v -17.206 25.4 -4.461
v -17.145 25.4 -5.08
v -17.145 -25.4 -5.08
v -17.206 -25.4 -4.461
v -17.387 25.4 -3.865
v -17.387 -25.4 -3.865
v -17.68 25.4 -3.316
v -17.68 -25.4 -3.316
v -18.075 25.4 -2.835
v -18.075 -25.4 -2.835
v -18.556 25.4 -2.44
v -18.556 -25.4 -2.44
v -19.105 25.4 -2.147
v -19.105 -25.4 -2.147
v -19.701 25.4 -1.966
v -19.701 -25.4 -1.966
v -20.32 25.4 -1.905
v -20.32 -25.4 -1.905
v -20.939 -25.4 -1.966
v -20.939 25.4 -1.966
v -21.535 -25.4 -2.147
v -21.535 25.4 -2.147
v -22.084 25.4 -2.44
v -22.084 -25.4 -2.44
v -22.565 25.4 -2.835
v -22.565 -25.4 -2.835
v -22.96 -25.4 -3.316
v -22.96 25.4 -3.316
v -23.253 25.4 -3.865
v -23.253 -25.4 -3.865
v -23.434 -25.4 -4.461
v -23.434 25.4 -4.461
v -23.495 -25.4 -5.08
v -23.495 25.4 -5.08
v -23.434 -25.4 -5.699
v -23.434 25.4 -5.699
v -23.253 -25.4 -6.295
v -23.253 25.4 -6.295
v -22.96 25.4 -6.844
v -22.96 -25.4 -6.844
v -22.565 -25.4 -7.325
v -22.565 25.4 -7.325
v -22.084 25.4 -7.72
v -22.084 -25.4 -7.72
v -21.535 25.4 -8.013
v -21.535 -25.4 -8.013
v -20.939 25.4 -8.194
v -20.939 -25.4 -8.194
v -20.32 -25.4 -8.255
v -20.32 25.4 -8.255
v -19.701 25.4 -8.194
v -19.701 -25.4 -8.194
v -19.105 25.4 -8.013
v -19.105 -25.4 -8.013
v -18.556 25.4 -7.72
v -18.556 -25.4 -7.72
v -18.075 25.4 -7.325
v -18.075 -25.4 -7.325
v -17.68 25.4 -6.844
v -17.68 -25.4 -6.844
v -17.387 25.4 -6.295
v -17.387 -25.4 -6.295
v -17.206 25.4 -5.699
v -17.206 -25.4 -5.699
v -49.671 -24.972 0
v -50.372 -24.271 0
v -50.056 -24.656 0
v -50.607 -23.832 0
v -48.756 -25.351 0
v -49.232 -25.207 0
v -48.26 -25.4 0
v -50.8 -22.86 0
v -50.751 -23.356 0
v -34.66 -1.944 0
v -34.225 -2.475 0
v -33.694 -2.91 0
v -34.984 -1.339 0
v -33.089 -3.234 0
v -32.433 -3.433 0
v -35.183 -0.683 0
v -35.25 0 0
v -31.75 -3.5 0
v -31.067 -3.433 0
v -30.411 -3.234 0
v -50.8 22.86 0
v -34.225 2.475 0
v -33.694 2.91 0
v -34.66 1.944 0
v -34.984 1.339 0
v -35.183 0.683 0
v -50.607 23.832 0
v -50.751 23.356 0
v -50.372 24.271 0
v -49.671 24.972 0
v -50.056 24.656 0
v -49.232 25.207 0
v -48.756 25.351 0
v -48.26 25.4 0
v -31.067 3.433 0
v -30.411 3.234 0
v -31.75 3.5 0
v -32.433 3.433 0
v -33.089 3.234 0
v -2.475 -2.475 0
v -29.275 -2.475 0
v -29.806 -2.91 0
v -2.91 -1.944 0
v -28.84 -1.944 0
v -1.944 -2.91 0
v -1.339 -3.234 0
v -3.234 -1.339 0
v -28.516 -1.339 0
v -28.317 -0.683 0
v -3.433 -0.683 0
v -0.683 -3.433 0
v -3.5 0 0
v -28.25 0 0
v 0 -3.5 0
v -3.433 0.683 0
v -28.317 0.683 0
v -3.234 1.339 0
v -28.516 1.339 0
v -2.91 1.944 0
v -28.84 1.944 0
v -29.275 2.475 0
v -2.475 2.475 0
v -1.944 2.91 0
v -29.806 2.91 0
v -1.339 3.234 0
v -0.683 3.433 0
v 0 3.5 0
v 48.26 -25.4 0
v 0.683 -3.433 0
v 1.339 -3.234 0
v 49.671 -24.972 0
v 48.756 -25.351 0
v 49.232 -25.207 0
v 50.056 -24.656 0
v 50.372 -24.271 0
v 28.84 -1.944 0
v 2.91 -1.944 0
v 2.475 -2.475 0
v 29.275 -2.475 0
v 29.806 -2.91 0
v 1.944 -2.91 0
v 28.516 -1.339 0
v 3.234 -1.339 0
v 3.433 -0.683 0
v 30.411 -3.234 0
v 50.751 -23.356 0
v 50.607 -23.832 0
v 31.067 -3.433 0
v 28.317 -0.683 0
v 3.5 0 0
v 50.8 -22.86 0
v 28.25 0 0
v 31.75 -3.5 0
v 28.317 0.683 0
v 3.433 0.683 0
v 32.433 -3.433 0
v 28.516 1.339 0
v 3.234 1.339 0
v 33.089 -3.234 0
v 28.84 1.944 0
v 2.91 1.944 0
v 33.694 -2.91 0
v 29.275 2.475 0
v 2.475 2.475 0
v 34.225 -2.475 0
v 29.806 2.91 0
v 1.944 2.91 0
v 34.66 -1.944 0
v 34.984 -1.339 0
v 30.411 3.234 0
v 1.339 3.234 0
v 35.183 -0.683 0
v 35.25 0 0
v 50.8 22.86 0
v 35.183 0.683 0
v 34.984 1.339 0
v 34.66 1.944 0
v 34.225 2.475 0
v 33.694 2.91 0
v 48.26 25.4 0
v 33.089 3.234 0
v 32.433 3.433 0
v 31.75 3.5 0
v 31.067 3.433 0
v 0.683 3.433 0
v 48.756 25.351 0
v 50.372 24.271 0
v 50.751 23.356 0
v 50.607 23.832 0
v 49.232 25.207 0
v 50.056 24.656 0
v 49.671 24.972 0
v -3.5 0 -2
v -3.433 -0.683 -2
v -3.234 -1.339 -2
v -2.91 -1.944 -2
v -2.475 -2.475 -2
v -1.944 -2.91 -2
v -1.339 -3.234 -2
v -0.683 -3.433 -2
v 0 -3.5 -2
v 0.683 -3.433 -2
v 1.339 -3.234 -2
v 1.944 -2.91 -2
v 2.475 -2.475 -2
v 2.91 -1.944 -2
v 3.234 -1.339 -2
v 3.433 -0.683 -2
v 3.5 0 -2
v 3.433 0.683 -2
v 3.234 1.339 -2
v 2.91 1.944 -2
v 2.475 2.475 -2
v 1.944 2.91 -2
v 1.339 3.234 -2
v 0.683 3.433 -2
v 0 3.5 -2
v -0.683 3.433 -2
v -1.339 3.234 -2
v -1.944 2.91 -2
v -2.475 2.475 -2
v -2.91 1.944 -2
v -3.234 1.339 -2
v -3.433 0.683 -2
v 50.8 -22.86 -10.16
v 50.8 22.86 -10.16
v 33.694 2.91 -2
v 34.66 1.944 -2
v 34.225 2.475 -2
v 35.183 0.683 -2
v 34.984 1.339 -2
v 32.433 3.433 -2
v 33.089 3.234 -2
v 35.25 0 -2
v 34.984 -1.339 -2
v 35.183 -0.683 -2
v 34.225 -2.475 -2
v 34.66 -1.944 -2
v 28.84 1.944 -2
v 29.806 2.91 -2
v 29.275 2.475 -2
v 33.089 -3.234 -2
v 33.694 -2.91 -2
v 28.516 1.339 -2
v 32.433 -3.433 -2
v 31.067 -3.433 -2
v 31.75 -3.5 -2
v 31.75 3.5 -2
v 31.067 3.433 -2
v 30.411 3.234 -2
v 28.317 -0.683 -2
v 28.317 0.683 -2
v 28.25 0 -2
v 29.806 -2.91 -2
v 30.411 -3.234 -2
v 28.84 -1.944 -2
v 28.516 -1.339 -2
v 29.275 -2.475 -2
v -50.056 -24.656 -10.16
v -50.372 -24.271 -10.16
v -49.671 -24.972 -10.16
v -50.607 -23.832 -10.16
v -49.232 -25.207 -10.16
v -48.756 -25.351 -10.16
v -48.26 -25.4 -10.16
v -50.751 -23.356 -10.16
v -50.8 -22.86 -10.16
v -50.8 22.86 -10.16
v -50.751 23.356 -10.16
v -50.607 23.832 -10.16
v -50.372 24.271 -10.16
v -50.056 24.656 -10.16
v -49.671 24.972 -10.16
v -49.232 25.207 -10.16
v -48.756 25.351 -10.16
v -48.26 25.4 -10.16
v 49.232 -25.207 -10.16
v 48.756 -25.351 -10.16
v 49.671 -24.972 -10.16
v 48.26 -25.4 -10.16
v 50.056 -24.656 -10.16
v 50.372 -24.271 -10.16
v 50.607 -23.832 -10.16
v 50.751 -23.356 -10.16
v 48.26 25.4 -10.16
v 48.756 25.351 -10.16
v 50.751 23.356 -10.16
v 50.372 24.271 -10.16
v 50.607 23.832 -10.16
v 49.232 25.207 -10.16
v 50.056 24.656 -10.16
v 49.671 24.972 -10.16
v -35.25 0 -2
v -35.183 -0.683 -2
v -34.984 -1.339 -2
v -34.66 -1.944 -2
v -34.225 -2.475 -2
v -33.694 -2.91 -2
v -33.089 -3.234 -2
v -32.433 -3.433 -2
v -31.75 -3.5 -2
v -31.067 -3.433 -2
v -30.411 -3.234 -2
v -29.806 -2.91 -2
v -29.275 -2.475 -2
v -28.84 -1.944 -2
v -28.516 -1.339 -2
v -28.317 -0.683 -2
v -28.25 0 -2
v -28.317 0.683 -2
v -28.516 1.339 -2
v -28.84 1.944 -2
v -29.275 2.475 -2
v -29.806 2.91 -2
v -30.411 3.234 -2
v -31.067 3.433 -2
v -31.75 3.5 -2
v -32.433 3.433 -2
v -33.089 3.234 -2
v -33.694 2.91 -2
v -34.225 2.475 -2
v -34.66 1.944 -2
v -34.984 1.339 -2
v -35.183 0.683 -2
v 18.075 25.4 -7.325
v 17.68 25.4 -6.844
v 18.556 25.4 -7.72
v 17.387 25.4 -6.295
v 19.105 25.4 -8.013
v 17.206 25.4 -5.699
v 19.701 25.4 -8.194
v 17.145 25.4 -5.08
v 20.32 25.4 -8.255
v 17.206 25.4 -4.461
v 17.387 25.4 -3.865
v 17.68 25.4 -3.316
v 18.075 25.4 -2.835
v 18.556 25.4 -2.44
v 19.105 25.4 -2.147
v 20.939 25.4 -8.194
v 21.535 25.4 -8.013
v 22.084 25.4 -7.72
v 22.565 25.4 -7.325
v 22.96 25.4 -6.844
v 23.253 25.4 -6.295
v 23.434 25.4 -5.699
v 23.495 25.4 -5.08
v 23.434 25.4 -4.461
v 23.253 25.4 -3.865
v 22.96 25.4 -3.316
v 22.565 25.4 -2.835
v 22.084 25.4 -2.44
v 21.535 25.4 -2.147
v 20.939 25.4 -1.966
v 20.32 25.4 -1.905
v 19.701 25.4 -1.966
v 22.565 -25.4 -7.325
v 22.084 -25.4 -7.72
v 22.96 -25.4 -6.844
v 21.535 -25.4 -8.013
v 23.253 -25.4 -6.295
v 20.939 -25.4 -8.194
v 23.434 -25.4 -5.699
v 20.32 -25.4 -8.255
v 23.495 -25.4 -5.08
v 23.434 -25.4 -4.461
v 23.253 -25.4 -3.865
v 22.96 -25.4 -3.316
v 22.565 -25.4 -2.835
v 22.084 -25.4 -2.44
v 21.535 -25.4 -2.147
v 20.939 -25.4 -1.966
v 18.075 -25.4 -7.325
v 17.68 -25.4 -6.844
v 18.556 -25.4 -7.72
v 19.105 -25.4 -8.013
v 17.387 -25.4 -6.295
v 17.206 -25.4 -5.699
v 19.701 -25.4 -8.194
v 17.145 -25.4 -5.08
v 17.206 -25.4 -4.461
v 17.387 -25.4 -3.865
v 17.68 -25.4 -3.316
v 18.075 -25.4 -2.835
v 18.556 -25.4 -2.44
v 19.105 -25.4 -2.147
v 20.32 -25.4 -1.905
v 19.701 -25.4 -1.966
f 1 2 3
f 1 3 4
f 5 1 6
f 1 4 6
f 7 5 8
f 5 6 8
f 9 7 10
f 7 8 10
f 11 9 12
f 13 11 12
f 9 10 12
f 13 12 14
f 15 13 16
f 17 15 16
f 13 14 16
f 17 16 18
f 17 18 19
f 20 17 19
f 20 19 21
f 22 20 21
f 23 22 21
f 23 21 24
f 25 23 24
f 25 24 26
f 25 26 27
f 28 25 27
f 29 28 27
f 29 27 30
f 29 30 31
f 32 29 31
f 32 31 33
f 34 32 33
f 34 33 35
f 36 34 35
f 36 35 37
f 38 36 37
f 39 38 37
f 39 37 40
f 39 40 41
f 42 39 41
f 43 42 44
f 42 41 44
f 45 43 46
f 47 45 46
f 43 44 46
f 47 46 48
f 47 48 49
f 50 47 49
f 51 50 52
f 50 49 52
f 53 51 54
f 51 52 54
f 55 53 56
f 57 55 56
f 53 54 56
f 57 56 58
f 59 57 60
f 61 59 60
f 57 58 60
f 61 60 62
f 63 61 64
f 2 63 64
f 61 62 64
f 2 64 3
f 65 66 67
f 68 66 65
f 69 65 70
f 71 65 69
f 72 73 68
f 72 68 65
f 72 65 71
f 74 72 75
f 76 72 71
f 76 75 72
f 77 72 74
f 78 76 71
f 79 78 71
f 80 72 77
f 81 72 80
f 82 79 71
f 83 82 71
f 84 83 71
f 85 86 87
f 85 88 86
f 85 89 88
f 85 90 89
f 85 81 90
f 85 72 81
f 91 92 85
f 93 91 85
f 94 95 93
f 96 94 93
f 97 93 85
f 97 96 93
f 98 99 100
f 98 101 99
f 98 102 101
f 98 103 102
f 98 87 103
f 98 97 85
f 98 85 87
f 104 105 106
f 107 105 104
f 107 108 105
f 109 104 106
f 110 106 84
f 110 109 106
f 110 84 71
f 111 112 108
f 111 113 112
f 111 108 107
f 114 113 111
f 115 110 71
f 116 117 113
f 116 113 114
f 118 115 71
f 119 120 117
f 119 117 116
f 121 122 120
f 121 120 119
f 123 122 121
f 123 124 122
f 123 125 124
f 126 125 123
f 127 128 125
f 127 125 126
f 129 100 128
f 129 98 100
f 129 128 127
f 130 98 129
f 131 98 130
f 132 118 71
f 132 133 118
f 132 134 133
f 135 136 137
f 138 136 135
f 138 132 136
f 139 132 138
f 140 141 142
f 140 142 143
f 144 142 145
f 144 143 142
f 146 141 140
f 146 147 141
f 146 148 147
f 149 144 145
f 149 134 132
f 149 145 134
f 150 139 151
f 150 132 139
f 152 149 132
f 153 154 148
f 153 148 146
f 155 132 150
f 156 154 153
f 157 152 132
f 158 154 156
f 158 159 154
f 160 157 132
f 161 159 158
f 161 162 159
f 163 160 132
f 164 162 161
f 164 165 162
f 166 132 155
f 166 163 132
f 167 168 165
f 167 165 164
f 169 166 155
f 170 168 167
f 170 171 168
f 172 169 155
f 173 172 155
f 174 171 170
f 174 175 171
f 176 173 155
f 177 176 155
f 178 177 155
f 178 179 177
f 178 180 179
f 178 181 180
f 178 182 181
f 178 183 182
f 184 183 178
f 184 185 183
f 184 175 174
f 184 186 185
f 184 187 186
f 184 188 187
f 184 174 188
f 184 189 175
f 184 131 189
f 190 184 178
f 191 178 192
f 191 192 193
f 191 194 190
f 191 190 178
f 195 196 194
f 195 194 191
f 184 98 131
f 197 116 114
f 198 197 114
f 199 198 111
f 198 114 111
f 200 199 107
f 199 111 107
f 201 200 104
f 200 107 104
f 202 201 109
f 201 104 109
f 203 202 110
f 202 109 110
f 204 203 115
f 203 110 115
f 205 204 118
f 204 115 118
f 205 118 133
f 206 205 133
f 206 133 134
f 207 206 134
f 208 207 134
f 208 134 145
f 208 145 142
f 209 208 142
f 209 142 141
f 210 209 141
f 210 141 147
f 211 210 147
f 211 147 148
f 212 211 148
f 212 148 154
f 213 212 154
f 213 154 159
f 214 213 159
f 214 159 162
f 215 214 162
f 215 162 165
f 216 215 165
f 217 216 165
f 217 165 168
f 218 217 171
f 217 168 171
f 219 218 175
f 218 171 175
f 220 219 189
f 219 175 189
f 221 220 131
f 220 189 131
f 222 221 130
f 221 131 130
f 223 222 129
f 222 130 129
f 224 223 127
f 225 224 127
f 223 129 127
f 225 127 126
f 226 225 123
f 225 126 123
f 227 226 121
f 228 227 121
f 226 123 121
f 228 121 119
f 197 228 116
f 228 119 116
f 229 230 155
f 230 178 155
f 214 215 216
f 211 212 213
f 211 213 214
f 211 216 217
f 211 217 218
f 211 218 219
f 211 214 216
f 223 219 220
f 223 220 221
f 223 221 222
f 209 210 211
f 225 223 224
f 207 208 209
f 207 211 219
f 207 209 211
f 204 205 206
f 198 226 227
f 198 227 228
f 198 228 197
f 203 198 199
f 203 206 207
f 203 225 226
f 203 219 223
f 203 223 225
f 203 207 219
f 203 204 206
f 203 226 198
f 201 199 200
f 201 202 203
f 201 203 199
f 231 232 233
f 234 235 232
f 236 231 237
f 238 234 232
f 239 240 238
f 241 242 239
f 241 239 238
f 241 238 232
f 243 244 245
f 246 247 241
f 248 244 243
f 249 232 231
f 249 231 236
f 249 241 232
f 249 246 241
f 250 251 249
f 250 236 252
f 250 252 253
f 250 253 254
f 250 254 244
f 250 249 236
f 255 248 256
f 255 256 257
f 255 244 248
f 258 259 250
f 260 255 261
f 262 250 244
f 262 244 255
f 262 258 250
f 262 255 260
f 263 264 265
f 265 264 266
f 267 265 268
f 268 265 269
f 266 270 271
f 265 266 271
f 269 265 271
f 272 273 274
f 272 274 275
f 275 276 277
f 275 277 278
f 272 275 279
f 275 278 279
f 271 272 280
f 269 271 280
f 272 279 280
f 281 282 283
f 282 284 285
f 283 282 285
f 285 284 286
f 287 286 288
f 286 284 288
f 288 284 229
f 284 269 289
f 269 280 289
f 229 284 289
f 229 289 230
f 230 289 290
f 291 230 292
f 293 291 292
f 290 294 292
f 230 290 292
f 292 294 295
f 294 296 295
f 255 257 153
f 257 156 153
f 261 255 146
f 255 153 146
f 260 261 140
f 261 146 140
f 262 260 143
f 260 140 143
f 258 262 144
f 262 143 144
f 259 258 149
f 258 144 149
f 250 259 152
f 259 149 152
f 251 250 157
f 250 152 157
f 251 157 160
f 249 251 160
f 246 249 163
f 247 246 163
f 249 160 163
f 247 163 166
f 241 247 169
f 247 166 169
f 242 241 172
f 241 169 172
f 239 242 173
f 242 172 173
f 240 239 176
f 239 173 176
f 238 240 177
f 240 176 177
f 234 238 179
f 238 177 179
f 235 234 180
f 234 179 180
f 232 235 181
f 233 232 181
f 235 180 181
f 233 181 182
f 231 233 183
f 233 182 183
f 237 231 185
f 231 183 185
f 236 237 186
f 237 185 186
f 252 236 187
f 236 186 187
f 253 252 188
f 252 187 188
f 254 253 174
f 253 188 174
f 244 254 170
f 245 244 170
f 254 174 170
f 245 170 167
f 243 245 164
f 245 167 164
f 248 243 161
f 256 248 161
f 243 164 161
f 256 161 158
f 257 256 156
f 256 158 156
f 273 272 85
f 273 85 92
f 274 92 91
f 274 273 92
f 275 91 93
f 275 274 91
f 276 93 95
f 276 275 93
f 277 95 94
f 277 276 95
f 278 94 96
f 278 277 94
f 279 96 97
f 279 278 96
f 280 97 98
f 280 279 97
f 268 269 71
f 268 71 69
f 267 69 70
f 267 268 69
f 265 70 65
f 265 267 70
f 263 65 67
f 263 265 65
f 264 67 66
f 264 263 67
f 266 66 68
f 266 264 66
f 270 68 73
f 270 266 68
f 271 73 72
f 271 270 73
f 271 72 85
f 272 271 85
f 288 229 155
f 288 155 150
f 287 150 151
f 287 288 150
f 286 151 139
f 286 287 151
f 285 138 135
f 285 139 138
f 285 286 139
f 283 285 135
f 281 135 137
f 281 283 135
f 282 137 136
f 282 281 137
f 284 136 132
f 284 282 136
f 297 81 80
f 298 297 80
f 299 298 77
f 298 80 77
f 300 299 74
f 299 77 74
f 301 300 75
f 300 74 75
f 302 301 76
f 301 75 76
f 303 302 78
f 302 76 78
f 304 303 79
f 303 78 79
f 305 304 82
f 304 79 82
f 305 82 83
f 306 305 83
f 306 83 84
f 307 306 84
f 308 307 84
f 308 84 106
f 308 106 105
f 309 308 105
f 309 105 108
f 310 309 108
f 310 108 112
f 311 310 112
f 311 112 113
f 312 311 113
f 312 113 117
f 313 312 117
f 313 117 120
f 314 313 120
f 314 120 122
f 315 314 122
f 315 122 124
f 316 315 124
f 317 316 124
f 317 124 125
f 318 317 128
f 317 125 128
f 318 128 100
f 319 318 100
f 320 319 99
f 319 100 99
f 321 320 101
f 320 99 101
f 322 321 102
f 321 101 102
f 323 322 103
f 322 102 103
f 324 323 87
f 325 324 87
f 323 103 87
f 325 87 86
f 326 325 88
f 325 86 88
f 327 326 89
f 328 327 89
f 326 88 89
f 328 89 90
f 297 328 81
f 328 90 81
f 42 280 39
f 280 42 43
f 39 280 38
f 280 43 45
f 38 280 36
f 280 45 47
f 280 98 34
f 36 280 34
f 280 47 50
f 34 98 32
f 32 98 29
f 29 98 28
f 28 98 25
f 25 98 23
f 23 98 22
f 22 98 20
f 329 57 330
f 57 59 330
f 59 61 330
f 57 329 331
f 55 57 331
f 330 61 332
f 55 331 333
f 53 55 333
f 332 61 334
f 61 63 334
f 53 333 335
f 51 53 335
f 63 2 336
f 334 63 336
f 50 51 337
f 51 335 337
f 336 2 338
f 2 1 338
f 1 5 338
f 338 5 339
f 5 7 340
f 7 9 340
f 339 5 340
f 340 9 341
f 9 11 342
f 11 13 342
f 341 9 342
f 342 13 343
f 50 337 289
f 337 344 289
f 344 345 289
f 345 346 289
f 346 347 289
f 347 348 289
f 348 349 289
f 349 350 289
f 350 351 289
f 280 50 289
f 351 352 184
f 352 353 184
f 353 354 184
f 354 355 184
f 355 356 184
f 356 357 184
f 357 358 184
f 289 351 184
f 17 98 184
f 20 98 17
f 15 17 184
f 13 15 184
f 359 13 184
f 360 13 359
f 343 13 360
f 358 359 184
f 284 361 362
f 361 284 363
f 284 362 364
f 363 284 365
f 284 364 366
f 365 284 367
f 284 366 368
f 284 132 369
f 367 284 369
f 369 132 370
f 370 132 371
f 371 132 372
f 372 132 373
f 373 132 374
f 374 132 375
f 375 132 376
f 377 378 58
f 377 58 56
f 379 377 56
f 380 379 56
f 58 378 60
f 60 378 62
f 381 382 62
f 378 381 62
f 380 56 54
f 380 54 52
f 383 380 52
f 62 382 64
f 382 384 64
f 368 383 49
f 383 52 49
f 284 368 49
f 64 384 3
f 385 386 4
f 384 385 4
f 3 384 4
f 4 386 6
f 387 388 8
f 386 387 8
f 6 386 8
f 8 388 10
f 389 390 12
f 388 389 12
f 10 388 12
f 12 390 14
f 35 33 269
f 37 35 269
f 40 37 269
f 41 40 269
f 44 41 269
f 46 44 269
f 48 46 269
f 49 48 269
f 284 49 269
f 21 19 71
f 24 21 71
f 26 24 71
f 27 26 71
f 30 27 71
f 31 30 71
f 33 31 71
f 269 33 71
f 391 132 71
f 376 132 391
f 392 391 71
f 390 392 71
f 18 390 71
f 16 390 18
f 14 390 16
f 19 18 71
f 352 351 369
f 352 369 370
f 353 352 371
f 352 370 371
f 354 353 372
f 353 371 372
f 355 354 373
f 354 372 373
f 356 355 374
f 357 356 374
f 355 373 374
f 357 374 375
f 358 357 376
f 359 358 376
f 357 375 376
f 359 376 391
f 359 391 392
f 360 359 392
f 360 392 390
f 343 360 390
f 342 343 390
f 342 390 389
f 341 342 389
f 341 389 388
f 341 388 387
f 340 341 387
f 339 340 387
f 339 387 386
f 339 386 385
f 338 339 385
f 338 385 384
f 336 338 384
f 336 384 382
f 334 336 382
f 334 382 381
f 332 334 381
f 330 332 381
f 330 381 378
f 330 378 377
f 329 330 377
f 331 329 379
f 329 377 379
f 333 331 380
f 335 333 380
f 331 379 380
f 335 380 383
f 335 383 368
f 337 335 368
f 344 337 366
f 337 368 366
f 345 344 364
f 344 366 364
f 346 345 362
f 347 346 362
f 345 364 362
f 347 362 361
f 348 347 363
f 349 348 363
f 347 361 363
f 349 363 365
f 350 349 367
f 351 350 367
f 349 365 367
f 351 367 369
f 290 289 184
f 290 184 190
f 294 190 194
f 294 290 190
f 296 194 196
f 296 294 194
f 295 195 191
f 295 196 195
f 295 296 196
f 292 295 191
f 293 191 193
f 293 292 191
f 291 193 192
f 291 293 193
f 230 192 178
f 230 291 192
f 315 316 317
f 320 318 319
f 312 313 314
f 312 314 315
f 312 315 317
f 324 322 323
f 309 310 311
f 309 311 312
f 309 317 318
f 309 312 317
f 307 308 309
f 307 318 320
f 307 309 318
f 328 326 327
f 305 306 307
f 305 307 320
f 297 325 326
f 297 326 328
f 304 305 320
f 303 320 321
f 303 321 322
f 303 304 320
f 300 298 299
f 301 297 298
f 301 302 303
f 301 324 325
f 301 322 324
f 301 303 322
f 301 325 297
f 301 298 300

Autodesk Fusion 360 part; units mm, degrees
sketch "Sketch1" plane through (0, 0, 0) normal (0, 0, 1) x (1, 0, 0)
  line L0 (50.8, -25.4) -> (-50.8, -25.4)
  line L1 (-50.8, -25.4) -> (-50.8, 25.4)
  line L2 (-50.8, 25.4) -> (50.8, 25.4)
  line L3 (50.8, 25.4) -> (50.8, -25.4)
  line L4 (50.8, -25.4) -> (-50.8, 25.4) construction
  line L5 (-50.8, -25.4) -> (50.8, 25.4) construction
  dimension "d2" = 101.6
  dimension "d8" = 50.8
extrude "Extrude1" add sketch "Sketch1" against normal blind 10.16
sketch "Sketch2" plane through (0, 0, 0) normal (0, 0, 1) x (-1, 0, 0)
  line L0 (-50.8, -25.4) -> (50.8, -25.4)
  line L1 (50.8, -25.4) -> (50.8, 25.4)
  line L2 (50.8, 25.4) -> (-50.8, 25.4)
  line L3 (-50.8, 25.4) -> (-50.8, -25.4)
  circle A0 centre (31.75, 0) radius 3.5
  circle A1 centre (0, 0) radius 3.5
  circle A2 centre (-31.75, 0) radius 3.5
  line L4 (12.7, -25.4) -> (12.7, 25.4) construction
  dimension "d11" = 7
  dimension "d12" = 19.05
  dimension "d13" = 7
  dimension "d14" = 50.8
  dimension "d15" = 7
  dimension "d16" = 19.05
  dimension "d17" = 25.4
  dimension "d18" = 25.4
  dimension "d19" = 25.4
  dimension "d22" = 38.1
extrude "Extrude2" cut sketch "Sketch2" against normal blind 2 contours A0 | A1 | A2
sketch "Sketch3" plane through (0, -25.4, 0) normal (0, -1, 0) x (1, 0, 0)
  line L0 (50.8, 0) -> (-50.8, 0)
  line L1 (-50.8, 0) -> (-50.8, -10.16)
  line L2 (-50.8, -10.16) -> (50.8, -10.16)
  line L3 (50.8, -10.16) -> (50.8, 0)
  circle A0 centre (-20.32, -5.08) radius 3.175
  circle A1 centre (20.32, -5.08) radius 3.175
  dimension "d23" = 30.48
  dimension "d24" = 30.48
  dimension "d25" = 6.35
  dimension "d26" = 6.35
  dimension "d27" = 5.08
  dimension "d28" = 5.08
extrude "Extrude3" cut sketch "Sketch3" against normal through all contours A0 | A1
fillet "Fillet1" radius 2.54 4 edges at (-50.8, -25.4, -5.08) (-50.8, 25.4, -5.08) (50.8, -25.4, -5.08) (50.8, 25.4, -5.08)
